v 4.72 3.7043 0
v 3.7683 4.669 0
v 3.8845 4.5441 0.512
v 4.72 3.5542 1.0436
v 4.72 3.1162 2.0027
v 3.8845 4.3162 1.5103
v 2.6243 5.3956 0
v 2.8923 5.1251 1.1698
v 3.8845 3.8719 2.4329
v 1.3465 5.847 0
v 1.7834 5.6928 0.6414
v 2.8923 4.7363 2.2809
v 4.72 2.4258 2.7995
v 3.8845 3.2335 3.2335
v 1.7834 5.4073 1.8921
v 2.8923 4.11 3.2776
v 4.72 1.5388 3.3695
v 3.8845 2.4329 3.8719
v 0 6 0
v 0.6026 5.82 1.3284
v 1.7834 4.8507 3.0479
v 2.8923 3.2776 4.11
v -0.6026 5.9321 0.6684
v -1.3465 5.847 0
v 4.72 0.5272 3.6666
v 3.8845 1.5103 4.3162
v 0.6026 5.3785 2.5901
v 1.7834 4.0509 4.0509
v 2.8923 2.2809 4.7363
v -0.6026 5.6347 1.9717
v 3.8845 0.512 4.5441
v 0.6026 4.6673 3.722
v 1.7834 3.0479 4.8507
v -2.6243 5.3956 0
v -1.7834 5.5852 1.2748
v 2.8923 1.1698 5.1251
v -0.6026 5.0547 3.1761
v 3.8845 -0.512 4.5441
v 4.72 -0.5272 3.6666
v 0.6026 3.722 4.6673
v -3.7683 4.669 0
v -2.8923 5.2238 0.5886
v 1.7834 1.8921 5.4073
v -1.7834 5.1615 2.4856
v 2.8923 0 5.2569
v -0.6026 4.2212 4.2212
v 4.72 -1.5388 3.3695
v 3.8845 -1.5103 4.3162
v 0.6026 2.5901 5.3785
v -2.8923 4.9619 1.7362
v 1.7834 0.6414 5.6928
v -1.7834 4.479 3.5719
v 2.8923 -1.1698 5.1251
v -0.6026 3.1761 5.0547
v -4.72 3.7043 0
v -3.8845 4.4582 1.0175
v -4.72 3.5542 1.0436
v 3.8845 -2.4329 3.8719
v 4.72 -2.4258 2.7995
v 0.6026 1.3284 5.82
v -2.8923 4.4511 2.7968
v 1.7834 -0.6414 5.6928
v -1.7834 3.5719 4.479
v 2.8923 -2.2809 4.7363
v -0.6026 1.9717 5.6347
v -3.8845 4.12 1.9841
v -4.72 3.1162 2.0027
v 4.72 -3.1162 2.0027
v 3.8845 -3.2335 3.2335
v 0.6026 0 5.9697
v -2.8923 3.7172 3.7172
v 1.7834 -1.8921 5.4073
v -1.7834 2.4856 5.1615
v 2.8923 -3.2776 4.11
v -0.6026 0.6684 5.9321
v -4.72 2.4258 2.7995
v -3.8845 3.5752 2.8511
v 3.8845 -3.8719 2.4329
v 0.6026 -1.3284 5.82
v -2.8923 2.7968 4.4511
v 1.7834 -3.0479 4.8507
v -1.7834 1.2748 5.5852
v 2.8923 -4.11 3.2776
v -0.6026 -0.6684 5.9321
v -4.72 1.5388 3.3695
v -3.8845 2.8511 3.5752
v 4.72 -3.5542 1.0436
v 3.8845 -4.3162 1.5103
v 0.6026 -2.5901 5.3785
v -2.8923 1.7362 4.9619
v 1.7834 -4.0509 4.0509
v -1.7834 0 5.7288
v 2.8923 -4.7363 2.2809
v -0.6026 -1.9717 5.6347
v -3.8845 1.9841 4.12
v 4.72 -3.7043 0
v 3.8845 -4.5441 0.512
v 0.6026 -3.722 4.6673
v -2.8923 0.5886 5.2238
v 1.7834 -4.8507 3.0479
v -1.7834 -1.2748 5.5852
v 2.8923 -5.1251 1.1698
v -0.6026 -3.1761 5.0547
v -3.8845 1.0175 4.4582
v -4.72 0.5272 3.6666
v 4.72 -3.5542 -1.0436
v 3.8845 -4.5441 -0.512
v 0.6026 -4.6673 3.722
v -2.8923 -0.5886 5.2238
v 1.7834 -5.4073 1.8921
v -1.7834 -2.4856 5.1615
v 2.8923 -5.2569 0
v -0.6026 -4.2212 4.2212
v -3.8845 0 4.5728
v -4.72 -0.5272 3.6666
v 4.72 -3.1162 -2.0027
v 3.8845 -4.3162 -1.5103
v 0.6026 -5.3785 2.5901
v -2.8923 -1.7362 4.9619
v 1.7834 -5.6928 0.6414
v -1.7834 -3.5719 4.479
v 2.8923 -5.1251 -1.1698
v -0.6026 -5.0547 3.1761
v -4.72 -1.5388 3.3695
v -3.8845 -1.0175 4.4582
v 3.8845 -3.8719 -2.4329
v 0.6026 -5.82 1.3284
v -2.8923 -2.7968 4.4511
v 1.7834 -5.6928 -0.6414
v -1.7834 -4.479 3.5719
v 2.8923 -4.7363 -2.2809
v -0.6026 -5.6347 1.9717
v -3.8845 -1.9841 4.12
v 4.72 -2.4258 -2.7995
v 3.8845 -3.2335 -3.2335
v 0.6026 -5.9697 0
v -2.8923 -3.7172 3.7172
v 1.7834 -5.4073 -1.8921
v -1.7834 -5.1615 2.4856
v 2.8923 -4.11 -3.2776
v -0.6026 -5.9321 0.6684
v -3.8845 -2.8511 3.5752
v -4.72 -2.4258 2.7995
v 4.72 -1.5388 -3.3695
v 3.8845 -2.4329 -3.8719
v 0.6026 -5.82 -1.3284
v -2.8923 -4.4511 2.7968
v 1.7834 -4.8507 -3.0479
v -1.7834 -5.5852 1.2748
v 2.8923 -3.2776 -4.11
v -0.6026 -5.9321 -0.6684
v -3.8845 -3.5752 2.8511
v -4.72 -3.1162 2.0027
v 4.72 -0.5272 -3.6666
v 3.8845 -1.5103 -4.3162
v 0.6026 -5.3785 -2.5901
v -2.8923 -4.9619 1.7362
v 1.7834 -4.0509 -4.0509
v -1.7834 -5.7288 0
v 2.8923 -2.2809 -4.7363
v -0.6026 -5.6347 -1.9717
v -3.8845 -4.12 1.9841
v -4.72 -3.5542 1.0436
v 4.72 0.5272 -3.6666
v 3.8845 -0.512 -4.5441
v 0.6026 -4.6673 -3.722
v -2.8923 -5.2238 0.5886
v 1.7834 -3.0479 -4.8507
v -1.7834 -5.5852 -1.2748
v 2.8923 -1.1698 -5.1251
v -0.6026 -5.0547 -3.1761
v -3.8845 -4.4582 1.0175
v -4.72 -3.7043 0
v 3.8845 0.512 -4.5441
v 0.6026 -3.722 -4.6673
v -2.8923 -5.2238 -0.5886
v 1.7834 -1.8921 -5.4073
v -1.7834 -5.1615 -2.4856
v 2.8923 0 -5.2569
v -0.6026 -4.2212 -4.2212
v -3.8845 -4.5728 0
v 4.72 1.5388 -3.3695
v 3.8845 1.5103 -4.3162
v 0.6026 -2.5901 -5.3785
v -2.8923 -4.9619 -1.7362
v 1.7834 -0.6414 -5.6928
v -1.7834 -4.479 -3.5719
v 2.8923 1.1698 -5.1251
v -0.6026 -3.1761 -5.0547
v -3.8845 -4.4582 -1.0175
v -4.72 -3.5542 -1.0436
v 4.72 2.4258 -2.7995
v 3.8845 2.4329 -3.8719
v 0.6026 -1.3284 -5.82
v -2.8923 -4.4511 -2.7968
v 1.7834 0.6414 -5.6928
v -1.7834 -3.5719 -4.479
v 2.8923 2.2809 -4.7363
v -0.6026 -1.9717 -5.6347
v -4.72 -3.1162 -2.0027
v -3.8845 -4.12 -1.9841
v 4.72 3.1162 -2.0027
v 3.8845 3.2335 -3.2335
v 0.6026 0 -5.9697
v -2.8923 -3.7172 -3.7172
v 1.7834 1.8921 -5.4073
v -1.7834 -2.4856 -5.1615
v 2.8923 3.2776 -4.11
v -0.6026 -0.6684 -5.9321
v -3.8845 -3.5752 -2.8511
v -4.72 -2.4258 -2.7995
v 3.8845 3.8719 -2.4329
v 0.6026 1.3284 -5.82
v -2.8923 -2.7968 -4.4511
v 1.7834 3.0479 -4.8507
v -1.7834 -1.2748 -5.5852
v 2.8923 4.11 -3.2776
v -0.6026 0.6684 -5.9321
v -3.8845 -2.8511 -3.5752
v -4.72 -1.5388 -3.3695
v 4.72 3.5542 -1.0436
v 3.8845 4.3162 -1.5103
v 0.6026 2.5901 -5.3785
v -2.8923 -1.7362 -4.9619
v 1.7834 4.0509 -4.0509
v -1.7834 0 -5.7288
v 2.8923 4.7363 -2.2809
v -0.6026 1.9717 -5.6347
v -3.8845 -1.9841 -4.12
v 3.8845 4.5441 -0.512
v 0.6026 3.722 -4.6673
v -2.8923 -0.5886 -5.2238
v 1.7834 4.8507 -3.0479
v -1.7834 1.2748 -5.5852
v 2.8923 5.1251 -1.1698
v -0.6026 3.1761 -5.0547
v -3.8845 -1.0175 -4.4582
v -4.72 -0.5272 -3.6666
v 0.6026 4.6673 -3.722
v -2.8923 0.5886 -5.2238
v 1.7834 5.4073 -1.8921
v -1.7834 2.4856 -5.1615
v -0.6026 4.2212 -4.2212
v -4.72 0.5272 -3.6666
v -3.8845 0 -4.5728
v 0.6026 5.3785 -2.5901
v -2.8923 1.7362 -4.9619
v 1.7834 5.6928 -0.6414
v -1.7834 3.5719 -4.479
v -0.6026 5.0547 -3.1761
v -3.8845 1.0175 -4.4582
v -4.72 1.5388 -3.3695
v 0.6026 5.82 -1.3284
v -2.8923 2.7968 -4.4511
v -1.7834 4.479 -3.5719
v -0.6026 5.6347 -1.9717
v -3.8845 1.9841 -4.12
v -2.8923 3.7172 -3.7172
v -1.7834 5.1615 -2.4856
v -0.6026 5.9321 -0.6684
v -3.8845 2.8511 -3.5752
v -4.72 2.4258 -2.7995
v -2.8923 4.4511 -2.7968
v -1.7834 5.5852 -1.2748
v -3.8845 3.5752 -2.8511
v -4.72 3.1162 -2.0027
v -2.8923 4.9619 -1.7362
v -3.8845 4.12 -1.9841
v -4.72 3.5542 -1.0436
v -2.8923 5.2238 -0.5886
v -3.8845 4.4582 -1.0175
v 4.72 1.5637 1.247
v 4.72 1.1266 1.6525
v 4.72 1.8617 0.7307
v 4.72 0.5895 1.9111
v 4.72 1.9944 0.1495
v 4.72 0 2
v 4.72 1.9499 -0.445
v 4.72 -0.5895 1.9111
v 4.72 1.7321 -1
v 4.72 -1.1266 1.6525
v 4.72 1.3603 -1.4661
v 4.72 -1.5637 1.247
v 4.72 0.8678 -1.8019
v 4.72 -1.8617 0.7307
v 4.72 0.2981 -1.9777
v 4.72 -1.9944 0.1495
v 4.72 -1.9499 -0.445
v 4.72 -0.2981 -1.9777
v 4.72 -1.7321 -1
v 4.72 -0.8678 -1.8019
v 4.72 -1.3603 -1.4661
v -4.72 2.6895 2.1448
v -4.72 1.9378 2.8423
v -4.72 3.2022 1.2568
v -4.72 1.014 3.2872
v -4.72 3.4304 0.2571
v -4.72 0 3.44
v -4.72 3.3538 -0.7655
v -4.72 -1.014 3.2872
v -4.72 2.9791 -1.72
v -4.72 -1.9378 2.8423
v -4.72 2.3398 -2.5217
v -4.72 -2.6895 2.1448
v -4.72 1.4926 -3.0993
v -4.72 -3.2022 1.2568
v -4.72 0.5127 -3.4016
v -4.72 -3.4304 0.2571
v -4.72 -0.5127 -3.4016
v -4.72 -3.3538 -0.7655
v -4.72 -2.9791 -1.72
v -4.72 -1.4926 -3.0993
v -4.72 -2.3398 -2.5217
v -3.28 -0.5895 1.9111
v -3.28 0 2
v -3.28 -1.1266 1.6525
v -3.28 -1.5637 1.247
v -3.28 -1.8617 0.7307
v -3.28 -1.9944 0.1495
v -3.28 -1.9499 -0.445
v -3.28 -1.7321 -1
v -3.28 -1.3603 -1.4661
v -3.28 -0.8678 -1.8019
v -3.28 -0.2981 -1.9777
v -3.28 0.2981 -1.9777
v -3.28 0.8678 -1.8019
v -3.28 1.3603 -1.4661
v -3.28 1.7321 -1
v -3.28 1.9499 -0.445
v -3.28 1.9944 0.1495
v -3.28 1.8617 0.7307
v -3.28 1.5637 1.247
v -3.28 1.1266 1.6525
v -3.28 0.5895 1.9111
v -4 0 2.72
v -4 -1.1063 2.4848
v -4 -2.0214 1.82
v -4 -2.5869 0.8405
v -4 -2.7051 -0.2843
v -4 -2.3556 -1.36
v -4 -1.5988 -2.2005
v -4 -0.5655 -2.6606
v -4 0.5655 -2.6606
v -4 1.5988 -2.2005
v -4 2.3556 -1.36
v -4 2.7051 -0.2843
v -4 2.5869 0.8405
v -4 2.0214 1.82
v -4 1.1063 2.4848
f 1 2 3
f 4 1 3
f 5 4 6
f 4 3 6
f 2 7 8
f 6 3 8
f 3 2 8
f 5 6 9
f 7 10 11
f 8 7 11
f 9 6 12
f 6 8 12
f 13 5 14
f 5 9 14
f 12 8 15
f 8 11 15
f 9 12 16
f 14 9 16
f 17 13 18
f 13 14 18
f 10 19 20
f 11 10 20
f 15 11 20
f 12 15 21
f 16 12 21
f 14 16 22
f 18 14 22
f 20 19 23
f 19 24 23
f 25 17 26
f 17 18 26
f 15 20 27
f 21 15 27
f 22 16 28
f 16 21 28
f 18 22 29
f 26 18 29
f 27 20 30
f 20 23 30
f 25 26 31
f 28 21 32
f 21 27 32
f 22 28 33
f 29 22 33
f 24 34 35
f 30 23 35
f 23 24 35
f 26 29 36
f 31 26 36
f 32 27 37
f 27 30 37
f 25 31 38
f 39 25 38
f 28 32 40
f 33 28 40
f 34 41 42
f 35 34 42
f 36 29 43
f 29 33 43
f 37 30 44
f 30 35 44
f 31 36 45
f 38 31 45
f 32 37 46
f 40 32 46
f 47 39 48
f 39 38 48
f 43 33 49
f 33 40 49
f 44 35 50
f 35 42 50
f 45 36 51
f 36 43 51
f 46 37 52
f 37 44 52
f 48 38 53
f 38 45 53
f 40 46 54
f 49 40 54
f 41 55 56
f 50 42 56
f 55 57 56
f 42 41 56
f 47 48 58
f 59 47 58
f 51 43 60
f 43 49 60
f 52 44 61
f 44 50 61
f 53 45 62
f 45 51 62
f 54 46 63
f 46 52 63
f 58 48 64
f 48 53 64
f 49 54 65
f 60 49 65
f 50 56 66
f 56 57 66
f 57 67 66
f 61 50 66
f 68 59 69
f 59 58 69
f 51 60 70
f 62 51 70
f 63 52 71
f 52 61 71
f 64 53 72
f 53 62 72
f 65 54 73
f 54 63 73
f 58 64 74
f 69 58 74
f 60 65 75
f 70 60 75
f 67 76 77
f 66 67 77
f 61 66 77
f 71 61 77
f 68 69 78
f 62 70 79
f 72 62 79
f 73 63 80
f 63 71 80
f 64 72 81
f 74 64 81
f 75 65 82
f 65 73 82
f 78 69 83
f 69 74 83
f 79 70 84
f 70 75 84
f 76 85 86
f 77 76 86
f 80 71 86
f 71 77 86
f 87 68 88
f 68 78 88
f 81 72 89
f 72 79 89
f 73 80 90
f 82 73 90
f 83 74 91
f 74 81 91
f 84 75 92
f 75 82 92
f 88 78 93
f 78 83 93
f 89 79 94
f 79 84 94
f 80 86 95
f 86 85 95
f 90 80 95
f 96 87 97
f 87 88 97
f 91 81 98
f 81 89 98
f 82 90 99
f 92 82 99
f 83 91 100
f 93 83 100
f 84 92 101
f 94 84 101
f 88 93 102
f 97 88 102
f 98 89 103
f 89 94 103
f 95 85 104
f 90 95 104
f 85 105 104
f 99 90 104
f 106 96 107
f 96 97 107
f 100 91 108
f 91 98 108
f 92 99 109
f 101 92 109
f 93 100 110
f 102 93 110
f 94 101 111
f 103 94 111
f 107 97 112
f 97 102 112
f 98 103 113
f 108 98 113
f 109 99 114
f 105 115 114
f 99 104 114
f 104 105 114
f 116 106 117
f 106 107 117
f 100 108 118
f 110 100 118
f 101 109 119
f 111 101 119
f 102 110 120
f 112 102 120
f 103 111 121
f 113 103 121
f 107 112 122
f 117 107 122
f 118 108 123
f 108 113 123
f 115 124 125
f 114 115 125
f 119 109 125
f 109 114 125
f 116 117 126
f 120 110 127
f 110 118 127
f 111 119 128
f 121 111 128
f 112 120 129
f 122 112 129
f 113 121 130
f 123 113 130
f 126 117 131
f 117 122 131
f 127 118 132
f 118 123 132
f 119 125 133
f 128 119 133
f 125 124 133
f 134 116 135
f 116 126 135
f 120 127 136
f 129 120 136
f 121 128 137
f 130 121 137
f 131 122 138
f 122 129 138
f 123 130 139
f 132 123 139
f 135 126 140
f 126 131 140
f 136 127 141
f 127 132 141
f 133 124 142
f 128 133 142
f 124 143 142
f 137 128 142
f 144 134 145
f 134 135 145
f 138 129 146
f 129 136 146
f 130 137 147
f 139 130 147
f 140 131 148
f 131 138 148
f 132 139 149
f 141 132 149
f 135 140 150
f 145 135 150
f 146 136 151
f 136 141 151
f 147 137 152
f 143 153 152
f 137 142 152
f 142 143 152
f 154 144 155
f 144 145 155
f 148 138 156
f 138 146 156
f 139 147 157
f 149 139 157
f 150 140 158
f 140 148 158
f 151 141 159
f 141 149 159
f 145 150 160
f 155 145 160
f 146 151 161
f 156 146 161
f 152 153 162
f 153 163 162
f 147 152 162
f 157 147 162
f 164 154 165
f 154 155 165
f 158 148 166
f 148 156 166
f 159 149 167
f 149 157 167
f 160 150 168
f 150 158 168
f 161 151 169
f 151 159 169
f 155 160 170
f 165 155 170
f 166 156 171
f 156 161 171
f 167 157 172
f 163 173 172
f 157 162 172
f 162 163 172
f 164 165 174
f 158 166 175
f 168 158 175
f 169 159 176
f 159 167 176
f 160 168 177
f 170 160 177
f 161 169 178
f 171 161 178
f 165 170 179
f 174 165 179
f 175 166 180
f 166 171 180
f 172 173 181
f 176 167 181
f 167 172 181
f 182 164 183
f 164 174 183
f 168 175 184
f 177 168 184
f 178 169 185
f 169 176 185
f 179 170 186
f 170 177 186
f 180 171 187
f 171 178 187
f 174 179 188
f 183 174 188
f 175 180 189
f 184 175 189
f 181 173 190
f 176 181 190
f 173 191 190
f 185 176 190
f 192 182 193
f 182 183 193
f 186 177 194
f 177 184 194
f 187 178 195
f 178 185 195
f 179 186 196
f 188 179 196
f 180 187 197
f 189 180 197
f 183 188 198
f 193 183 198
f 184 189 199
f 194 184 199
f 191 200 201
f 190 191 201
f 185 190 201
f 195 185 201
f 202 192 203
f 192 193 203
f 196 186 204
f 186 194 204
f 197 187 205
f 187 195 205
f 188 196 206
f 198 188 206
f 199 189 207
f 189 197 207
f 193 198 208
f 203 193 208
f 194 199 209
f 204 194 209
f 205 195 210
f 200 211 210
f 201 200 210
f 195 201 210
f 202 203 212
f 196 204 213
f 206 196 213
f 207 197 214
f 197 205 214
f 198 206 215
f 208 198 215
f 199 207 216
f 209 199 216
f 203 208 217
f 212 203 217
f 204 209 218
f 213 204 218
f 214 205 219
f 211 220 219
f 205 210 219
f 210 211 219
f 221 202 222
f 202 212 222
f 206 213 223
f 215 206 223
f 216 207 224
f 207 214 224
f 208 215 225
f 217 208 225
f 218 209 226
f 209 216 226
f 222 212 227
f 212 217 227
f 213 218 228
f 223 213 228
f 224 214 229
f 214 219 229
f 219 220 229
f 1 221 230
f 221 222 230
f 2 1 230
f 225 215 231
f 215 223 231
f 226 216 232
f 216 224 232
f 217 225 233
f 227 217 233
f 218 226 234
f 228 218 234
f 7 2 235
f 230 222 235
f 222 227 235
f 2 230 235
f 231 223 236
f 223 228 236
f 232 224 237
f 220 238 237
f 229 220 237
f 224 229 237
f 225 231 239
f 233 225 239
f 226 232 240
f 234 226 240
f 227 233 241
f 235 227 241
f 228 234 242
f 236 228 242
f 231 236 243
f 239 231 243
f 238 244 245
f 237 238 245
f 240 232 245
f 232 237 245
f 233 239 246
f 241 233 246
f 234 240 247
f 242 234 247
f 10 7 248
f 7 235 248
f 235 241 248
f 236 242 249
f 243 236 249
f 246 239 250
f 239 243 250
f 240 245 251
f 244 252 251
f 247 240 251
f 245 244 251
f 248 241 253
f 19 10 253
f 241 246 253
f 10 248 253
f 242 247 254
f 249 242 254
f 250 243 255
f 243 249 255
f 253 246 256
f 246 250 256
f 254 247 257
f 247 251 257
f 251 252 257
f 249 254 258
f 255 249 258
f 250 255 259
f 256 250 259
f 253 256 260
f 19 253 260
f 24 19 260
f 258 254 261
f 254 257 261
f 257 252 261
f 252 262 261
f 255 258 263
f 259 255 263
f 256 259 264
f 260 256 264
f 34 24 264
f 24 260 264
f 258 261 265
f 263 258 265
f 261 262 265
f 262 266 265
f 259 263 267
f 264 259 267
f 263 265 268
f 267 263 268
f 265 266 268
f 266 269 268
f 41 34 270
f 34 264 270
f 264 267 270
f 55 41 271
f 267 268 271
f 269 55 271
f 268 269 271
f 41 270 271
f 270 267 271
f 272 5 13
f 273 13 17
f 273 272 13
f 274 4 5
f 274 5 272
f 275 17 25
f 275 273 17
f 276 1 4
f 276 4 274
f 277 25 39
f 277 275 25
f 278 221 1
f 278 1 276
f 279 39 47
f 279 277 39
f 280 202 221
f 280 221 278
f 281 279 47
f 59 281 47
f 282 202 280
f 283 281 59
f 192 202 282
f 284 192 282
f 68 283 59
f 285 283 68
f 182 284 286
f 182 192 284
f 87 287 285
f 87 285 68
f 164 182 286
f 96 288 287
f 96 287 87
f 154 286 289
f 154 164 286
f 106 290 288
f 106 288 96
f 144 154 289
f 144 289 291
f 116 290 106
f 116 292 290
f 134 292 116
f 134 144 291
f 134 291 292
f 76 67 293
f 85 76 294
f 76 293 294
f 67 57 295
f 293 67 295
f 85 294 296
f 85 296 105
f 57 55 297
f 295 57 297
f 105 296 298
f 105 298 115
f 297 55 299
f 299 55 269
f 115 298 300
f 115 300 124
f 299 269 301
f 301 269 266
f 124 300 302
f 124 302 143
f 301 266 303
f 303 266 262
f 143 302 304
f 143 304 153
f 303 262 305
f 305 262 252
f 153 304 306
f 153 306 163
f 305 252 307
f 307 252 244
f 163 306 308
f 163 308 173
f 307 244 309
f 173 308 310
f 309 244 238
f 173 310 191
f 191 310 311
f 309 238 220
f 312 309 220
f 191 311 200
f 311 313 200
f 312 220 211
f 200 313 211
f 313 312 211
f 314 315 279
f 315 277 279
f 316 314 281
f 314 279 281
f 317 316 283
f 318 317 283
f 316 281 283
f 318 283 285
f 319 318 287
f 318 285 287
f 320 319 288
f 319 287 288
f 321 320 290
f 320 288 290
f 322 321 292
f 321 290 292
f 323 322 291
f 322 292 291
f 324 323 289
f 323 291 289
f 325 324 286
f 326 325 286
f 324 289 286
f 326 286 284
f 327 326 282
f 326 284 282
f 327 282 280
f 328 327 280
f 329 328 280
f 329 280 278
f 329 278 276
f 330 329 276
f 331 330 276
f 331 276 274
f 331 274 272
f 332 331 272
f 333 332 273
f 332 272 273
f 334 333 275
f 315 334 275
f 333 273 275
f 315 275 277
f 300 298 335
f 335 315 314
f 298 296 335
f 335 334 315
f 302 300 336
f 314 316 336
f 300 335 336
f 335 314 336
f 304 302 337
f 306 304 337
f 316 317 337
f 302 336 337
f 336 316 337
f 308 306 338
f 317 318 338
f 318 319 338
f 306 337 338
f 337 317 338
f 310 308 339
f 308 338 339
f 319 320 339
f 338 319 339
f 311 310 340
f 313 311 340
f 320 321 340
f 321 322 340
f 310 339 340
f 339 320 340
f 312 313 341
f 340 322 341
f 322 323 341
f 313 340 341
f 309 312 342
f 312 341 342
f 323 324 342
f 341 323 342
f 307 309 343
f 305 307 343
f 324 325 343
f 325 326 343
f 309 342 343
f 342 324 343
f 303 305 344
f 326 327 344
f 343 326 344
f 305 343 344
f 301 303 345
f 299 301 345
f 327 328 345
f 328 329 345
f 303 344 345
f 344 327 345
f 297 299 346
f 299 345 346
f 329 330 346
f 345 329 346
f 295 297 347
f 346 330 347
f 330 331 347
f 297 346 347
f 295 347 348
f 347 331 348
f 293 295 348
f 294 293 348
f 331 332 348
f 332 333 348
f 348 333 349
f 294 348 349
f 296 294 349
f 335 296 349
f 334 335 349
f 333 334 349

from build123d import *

# Parameters (mm, degrees)
CUT_EXTRUDE2_DEPTH      = 7
CUT_EXTRUDE2_DEPTH_BACK = 7


with BuildPart() as part:
    # Sketch1 → Revolve1 (revolve)
    with BuildSketch(Plane.XY):
        with BuildLine():
            Line((-6, 0), (6, 0))
            ThreePointArc((6, 0), (0, 6), (-6, 0))
        make_face()
    revolve(axis=Axis((-13.60120179, 0, 0), (1, 0, 0)))

    # Sketch2 → Cut-Extrude2 (cut, two sides)
    with BuildSketch(Plane.XY) as cut_extrude2_sk:
        with BuildLine():
            Line((-4.72, 3.704267809), (-4.72, -3.704267809))
            ThreePointArc((-4.72, -3.704267809), (-6, 0), (-4.72, 3.704267809))
        make_face()
        with BuildLine():
            Line((4.72, 3.704267809), (4.72, -3.704267809))
            ThreePointArc((4.72, -3.704267809), (6, 0), (4.72, 3.704267809))
        make_face()
    extrude(amount=CUT_EXTRUDE2_DEPTH, mode=Mode.SUBTRACT)
    extrude(cut_extrude2_sk.sketch, amount=-CUT_EXTRUDE2_DEPTH_BACK, mode=Mode.SUBTRACT)

    # Sketch3 → Cut-Revolve1 (revolve, cut)
    with BuildSketch(Plane.XY, mode=Mode.PRIVATE) as cut_revolve1_sk:
        Polygon((-4.72, 3.44), (-3.28, 2), (4.72, 2), (4.72, 0), (-4.72, 0), align=None)
    revolve(cut_revolve1_sk.sketch.rotate(Axis((-7.010525763, 0, 0), (1, 0, 0)), 90), axis=Axis((-7.010525763, 0, 0), (1, 0, 0)), mode=Mode.SUBTRACT)  # turned: the seam where the file's is


solid = part.part
